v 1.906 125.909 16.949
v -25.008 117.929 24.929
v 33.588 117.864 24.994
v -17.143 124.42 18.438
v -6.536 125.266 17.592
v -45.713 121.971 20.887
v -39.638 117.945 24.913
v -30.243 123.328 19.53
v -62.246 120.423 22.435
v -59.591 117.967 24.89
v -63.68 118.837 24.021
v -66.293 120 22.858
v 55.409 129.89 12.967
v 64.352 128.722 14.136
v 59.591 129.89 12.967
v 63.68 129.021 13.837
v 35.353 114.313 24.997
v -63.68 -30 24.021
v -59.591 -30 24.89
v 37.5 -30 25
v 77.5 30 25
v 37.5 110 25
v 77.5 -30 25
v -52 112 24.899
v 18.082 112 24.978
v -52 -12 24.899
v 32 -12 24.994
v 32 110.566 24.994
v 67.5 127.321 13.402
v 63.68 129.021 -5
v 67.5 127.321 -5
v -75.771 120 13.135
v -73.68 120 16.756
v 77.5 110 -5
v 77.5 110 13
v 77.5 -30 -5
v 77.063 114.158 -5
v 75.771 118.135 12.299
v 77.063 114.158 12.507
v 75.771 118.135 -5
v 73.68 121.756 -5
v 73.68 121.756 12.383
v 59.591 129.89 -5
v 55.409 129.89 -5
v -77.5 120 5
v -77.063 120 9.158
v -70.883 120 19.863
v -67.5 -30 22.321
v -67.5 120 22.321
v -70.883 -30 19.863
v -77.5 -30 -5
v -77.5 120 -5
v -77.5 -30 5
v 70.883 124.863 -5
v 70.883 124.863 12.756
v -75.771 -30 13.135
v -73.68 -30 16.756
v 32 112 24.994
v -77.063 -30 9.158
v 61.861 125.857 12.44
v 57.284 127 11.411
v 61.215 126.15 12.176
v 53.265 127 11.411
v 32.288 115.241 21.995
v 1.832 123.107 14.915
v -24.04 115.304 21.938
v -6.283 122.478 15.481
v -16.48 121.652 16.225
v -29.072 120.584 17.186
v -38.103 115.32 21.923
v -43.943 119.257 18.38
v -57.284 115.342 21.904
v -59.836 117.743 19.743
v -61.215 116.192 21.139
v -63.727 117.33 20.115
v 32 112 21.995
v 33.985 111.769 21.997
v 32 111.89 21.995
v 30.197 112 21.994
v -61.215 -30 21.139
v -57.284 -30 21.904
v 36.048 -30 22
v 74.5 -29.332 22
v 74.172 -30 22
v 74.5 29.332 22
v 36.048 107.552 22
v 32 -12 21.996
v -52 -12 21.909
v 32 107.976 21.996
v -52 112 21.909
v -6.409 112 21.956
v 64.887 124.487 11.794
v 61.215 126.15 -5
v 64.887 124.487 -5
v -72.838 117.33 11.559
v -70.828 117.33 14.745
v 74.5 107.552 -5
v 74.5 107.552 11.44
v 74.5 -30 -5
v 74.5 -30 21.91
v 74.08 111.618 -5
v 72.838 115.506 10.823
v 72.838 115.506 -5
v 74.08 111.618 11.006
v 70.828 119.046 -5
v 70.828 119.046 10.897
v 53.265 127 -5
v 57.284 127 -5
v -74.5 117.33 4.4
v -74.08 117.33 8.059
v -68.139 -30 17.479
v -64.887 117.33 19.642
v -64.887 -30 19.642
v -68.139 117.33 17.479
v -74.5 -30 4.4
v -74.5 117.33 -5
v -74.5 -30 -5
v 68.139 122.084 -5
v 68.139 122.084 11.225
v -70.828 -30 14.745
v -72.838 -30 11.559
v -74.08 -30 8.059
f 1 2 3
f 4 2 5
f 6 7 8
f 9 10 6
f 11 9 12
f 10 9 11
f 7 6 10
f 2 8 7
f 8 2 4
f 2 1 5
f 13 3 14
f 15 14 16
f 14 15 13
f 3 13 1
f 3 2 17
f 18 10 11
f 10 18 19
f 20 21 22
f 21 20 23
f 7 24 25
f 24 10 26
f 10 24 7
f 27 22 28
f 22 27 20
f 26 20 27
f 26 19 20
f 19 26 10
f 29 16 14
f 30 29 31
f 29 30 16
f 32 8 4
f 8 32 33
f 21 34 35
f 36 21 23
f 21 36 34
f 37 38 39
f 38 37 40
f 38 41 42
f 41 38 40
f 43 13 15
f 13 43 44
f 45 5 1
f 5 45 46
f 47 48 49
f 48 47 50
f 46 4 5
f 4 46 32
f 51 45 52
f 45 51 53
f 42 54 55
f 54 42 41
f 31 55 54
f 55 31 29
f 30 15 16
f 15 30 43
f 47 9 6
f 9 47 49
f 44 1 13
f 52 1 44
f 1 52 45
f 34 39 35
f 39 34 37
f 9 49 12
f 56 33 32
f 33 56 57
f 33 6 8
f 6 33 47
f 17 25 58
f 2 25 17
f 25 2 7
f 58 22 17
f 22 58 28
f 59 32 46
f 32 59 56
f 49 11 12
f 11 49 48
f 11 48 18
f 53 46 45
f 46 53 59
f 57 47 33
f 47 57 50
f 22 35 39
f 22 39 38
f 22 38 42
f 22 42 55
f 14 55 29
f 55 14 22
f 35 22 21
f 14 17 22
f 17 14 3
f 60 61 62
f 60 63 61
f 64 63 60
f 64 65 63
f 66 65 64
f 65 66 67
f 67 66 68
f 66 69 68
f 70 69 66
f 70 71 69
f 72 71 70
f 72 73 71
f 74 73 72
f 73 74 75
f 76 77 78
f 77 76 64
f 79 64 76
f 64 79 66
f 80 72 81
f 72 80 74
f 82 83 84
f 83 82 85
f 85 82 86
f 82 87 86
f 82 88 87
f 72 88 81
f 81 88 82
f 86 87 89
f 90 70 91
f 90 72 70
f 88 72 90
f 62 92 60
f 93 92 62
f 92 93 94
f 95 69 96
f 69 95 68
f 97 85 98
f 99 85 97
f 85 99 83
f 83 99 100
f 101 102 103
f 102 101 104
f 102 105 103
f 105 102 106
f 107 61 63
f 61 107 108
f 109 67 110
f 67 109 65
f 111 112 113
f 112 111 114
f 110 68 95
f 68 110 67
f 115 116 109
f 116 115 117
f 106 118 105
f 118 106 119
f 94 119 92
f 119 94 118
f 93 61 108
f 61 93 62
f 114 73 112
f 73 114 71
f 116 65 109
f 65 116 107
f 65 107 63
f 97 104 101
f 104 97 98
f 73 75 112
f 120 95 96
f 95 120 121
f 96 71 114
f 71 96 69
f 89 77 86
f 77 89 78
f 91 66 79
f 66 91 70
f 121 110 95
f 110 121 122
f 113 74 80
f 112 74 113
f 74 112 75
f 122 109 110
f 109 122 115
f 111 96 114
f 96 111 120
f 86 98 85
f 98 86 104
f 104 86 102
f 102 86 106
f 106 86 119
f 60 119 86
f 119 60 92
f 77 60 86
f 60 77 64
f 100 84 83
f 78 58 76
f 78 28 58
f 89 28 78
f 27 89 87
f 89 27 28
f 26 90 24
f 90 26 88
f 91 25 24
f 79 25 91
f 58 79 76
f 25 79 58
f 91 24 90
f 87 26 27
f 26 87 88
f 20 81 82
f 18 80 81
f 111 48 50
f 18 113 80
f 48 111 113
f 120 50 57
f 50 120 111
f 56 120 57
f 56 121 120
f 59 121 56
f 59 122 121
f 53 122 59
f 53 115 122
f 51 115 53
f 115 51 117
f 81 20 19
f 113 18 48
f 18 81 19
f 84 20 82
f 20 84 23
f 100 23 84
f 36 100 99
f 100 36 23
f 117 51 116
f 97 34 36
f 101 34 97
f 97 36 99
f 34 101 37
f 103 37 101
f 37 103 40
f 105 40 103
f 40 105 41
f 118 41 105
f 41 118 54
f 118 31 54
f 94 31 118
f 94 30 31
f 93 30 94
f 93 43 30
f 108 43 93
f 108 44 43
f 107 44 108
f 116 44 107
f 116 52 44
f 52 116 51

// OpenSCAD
$fn=30;

width = 155;
length = 260;
height = 50;

edge_r = 20;

/***
Main Body Hull
**/

module edges_parts(h){
    translate([0, length/2-edge_r,0]){
        cylinder(h,r=edge_r,center=true);
    }

    translate([0, -length/2+edge_r,0]){
        cylinder(h,r=edge_r,center=true);
    }
}


module edges(){
    
    translate([width/2-edge_r,0,0]) { 
        edges_parts(height);
        }
 
    
        
    translate([-width/2+20,0,height/2-20]){
    rotate([90,0,0]) cylinder(h=length-20,r=20,center=true);
    }
    cube_d = height;

    translate([-(width/2-cube_d/2),0,-(height/2-cube_d/4)])
    cube([cube_d,length-edge_r,height/2],center=true);
        
    
}

 l = 100;
 h = 15;
 w = 50;  
 dw = 20;    
 disp=0;
//hull() edges();
module cutout_edge_right(){
    
polyhedron(    
        points=[
               [w,0,0], 
                [0,l,0], 
                [w,l,0],
                [w,l,-h]
        ],
        faces = [
            [ 0,1,2],
            [0,2,3],
        [1,3,2], [1,0,3]]
            
  );
}

module cutout_edge_left(){
    
polyhedron(    
        points=[
               [w,0,0], 
                [0,-l,0], 
                [w,-l,0],
                [w,-l,-h]
        ],
        faces = [
            [ 0,1,2],
            [0,2,3],
        [1,3,2], [1,0,3]]
            
  );
}



//cutout_x = 50;


module corner_bottom_left(){
 translate([width/2-w/2+disp,length/2-l/2,height/2-h/2]) {
    translate([-w/2,-l/2,h/2])color("red") cutout_edge_right();
 }
}

//translate([0,0,-5]) hull() edges();

module corner_bottom_right(){
translate([width/2-w/2+disp,-length/2+l/2, height/2-h/2]){
 translate([-w/2,l/2,h/2]) //center it
 color("blue") cutout_edge_left();
}
}




module body(){
    hull() edges(); 
}

//edges();
//body();

module main(){
difference(){
    body();
    corner_bottom_left();
    corner_bottom_right();
    sloped_side_cutout();

}
}



module sloped_side_cutout(){
cx = 200;
cy = 20;
cz = 20;
zcut = 2;

//translate([cx/,0])
translate([0,length/2,height/2+zcut]){
rotate([45,0,0]) color("blue") cube([cx,cy,cz],center=true);
}

translate([0,-length/2,height/2+zcut]){
rotate([45,0,0]) color("blue") cube([cx,cy,cz],center=true);
}
}


walls = 6;
nx = width - walls;
ny = length - walls;
nz = height - walls;
module inner_box(){
    
    resize([nx,ny,nz]) main();
}


module main_box(){

    difference(){
        main();
        inner_box();
      //  cube([200,200,200]);
      // translate([60,-200,0]) cube([200,200,200]);

    }
}


button_w = 84;
button_l = 124;
button_h = height+2;
button_s = 4;

stick_w=94;
stick_l = 54;
stick_h = height+5;
stick_s = 4;

module main_box_with_holes(){

difference(){
    main_box();

    translate([-10,50,4])
    cube([button_w,button_l, button_h],center=true);

    translate([-10,-70,6])
    cube([stick_w,stick_l, stick_h],center=true);
}

}


module left_side(){

    difference(){
        main_box_with_holes();
        translate([0,70,0])
        cube([200,200,100],center=true);
    }

}

module right_side(){
    
    difference(){
        main_box_with_holes();
        translate([0,-130,0])
        cube([200,200,100],center=true);
    }
    
}

module top_left(){
difference(){
    left_side();
    translate([0,0,-20])
    cube([400,400,30],center=true);

}
}

module top_right(){

difference(){
    right_side();
    
    translate([0,0,-20])
    cube([400,400,30],center=true);
}    
}


top_right();

/**
translate([-button_w/2-10,45,10])
cube([button_s, button_l,height-4],center=true);

translate([button_w/2-10,50,0])
cube([button_s, button_l,height-4],center=true);

**/

//translate([-35,0,0])
//cube([80,35,200],center=true);
